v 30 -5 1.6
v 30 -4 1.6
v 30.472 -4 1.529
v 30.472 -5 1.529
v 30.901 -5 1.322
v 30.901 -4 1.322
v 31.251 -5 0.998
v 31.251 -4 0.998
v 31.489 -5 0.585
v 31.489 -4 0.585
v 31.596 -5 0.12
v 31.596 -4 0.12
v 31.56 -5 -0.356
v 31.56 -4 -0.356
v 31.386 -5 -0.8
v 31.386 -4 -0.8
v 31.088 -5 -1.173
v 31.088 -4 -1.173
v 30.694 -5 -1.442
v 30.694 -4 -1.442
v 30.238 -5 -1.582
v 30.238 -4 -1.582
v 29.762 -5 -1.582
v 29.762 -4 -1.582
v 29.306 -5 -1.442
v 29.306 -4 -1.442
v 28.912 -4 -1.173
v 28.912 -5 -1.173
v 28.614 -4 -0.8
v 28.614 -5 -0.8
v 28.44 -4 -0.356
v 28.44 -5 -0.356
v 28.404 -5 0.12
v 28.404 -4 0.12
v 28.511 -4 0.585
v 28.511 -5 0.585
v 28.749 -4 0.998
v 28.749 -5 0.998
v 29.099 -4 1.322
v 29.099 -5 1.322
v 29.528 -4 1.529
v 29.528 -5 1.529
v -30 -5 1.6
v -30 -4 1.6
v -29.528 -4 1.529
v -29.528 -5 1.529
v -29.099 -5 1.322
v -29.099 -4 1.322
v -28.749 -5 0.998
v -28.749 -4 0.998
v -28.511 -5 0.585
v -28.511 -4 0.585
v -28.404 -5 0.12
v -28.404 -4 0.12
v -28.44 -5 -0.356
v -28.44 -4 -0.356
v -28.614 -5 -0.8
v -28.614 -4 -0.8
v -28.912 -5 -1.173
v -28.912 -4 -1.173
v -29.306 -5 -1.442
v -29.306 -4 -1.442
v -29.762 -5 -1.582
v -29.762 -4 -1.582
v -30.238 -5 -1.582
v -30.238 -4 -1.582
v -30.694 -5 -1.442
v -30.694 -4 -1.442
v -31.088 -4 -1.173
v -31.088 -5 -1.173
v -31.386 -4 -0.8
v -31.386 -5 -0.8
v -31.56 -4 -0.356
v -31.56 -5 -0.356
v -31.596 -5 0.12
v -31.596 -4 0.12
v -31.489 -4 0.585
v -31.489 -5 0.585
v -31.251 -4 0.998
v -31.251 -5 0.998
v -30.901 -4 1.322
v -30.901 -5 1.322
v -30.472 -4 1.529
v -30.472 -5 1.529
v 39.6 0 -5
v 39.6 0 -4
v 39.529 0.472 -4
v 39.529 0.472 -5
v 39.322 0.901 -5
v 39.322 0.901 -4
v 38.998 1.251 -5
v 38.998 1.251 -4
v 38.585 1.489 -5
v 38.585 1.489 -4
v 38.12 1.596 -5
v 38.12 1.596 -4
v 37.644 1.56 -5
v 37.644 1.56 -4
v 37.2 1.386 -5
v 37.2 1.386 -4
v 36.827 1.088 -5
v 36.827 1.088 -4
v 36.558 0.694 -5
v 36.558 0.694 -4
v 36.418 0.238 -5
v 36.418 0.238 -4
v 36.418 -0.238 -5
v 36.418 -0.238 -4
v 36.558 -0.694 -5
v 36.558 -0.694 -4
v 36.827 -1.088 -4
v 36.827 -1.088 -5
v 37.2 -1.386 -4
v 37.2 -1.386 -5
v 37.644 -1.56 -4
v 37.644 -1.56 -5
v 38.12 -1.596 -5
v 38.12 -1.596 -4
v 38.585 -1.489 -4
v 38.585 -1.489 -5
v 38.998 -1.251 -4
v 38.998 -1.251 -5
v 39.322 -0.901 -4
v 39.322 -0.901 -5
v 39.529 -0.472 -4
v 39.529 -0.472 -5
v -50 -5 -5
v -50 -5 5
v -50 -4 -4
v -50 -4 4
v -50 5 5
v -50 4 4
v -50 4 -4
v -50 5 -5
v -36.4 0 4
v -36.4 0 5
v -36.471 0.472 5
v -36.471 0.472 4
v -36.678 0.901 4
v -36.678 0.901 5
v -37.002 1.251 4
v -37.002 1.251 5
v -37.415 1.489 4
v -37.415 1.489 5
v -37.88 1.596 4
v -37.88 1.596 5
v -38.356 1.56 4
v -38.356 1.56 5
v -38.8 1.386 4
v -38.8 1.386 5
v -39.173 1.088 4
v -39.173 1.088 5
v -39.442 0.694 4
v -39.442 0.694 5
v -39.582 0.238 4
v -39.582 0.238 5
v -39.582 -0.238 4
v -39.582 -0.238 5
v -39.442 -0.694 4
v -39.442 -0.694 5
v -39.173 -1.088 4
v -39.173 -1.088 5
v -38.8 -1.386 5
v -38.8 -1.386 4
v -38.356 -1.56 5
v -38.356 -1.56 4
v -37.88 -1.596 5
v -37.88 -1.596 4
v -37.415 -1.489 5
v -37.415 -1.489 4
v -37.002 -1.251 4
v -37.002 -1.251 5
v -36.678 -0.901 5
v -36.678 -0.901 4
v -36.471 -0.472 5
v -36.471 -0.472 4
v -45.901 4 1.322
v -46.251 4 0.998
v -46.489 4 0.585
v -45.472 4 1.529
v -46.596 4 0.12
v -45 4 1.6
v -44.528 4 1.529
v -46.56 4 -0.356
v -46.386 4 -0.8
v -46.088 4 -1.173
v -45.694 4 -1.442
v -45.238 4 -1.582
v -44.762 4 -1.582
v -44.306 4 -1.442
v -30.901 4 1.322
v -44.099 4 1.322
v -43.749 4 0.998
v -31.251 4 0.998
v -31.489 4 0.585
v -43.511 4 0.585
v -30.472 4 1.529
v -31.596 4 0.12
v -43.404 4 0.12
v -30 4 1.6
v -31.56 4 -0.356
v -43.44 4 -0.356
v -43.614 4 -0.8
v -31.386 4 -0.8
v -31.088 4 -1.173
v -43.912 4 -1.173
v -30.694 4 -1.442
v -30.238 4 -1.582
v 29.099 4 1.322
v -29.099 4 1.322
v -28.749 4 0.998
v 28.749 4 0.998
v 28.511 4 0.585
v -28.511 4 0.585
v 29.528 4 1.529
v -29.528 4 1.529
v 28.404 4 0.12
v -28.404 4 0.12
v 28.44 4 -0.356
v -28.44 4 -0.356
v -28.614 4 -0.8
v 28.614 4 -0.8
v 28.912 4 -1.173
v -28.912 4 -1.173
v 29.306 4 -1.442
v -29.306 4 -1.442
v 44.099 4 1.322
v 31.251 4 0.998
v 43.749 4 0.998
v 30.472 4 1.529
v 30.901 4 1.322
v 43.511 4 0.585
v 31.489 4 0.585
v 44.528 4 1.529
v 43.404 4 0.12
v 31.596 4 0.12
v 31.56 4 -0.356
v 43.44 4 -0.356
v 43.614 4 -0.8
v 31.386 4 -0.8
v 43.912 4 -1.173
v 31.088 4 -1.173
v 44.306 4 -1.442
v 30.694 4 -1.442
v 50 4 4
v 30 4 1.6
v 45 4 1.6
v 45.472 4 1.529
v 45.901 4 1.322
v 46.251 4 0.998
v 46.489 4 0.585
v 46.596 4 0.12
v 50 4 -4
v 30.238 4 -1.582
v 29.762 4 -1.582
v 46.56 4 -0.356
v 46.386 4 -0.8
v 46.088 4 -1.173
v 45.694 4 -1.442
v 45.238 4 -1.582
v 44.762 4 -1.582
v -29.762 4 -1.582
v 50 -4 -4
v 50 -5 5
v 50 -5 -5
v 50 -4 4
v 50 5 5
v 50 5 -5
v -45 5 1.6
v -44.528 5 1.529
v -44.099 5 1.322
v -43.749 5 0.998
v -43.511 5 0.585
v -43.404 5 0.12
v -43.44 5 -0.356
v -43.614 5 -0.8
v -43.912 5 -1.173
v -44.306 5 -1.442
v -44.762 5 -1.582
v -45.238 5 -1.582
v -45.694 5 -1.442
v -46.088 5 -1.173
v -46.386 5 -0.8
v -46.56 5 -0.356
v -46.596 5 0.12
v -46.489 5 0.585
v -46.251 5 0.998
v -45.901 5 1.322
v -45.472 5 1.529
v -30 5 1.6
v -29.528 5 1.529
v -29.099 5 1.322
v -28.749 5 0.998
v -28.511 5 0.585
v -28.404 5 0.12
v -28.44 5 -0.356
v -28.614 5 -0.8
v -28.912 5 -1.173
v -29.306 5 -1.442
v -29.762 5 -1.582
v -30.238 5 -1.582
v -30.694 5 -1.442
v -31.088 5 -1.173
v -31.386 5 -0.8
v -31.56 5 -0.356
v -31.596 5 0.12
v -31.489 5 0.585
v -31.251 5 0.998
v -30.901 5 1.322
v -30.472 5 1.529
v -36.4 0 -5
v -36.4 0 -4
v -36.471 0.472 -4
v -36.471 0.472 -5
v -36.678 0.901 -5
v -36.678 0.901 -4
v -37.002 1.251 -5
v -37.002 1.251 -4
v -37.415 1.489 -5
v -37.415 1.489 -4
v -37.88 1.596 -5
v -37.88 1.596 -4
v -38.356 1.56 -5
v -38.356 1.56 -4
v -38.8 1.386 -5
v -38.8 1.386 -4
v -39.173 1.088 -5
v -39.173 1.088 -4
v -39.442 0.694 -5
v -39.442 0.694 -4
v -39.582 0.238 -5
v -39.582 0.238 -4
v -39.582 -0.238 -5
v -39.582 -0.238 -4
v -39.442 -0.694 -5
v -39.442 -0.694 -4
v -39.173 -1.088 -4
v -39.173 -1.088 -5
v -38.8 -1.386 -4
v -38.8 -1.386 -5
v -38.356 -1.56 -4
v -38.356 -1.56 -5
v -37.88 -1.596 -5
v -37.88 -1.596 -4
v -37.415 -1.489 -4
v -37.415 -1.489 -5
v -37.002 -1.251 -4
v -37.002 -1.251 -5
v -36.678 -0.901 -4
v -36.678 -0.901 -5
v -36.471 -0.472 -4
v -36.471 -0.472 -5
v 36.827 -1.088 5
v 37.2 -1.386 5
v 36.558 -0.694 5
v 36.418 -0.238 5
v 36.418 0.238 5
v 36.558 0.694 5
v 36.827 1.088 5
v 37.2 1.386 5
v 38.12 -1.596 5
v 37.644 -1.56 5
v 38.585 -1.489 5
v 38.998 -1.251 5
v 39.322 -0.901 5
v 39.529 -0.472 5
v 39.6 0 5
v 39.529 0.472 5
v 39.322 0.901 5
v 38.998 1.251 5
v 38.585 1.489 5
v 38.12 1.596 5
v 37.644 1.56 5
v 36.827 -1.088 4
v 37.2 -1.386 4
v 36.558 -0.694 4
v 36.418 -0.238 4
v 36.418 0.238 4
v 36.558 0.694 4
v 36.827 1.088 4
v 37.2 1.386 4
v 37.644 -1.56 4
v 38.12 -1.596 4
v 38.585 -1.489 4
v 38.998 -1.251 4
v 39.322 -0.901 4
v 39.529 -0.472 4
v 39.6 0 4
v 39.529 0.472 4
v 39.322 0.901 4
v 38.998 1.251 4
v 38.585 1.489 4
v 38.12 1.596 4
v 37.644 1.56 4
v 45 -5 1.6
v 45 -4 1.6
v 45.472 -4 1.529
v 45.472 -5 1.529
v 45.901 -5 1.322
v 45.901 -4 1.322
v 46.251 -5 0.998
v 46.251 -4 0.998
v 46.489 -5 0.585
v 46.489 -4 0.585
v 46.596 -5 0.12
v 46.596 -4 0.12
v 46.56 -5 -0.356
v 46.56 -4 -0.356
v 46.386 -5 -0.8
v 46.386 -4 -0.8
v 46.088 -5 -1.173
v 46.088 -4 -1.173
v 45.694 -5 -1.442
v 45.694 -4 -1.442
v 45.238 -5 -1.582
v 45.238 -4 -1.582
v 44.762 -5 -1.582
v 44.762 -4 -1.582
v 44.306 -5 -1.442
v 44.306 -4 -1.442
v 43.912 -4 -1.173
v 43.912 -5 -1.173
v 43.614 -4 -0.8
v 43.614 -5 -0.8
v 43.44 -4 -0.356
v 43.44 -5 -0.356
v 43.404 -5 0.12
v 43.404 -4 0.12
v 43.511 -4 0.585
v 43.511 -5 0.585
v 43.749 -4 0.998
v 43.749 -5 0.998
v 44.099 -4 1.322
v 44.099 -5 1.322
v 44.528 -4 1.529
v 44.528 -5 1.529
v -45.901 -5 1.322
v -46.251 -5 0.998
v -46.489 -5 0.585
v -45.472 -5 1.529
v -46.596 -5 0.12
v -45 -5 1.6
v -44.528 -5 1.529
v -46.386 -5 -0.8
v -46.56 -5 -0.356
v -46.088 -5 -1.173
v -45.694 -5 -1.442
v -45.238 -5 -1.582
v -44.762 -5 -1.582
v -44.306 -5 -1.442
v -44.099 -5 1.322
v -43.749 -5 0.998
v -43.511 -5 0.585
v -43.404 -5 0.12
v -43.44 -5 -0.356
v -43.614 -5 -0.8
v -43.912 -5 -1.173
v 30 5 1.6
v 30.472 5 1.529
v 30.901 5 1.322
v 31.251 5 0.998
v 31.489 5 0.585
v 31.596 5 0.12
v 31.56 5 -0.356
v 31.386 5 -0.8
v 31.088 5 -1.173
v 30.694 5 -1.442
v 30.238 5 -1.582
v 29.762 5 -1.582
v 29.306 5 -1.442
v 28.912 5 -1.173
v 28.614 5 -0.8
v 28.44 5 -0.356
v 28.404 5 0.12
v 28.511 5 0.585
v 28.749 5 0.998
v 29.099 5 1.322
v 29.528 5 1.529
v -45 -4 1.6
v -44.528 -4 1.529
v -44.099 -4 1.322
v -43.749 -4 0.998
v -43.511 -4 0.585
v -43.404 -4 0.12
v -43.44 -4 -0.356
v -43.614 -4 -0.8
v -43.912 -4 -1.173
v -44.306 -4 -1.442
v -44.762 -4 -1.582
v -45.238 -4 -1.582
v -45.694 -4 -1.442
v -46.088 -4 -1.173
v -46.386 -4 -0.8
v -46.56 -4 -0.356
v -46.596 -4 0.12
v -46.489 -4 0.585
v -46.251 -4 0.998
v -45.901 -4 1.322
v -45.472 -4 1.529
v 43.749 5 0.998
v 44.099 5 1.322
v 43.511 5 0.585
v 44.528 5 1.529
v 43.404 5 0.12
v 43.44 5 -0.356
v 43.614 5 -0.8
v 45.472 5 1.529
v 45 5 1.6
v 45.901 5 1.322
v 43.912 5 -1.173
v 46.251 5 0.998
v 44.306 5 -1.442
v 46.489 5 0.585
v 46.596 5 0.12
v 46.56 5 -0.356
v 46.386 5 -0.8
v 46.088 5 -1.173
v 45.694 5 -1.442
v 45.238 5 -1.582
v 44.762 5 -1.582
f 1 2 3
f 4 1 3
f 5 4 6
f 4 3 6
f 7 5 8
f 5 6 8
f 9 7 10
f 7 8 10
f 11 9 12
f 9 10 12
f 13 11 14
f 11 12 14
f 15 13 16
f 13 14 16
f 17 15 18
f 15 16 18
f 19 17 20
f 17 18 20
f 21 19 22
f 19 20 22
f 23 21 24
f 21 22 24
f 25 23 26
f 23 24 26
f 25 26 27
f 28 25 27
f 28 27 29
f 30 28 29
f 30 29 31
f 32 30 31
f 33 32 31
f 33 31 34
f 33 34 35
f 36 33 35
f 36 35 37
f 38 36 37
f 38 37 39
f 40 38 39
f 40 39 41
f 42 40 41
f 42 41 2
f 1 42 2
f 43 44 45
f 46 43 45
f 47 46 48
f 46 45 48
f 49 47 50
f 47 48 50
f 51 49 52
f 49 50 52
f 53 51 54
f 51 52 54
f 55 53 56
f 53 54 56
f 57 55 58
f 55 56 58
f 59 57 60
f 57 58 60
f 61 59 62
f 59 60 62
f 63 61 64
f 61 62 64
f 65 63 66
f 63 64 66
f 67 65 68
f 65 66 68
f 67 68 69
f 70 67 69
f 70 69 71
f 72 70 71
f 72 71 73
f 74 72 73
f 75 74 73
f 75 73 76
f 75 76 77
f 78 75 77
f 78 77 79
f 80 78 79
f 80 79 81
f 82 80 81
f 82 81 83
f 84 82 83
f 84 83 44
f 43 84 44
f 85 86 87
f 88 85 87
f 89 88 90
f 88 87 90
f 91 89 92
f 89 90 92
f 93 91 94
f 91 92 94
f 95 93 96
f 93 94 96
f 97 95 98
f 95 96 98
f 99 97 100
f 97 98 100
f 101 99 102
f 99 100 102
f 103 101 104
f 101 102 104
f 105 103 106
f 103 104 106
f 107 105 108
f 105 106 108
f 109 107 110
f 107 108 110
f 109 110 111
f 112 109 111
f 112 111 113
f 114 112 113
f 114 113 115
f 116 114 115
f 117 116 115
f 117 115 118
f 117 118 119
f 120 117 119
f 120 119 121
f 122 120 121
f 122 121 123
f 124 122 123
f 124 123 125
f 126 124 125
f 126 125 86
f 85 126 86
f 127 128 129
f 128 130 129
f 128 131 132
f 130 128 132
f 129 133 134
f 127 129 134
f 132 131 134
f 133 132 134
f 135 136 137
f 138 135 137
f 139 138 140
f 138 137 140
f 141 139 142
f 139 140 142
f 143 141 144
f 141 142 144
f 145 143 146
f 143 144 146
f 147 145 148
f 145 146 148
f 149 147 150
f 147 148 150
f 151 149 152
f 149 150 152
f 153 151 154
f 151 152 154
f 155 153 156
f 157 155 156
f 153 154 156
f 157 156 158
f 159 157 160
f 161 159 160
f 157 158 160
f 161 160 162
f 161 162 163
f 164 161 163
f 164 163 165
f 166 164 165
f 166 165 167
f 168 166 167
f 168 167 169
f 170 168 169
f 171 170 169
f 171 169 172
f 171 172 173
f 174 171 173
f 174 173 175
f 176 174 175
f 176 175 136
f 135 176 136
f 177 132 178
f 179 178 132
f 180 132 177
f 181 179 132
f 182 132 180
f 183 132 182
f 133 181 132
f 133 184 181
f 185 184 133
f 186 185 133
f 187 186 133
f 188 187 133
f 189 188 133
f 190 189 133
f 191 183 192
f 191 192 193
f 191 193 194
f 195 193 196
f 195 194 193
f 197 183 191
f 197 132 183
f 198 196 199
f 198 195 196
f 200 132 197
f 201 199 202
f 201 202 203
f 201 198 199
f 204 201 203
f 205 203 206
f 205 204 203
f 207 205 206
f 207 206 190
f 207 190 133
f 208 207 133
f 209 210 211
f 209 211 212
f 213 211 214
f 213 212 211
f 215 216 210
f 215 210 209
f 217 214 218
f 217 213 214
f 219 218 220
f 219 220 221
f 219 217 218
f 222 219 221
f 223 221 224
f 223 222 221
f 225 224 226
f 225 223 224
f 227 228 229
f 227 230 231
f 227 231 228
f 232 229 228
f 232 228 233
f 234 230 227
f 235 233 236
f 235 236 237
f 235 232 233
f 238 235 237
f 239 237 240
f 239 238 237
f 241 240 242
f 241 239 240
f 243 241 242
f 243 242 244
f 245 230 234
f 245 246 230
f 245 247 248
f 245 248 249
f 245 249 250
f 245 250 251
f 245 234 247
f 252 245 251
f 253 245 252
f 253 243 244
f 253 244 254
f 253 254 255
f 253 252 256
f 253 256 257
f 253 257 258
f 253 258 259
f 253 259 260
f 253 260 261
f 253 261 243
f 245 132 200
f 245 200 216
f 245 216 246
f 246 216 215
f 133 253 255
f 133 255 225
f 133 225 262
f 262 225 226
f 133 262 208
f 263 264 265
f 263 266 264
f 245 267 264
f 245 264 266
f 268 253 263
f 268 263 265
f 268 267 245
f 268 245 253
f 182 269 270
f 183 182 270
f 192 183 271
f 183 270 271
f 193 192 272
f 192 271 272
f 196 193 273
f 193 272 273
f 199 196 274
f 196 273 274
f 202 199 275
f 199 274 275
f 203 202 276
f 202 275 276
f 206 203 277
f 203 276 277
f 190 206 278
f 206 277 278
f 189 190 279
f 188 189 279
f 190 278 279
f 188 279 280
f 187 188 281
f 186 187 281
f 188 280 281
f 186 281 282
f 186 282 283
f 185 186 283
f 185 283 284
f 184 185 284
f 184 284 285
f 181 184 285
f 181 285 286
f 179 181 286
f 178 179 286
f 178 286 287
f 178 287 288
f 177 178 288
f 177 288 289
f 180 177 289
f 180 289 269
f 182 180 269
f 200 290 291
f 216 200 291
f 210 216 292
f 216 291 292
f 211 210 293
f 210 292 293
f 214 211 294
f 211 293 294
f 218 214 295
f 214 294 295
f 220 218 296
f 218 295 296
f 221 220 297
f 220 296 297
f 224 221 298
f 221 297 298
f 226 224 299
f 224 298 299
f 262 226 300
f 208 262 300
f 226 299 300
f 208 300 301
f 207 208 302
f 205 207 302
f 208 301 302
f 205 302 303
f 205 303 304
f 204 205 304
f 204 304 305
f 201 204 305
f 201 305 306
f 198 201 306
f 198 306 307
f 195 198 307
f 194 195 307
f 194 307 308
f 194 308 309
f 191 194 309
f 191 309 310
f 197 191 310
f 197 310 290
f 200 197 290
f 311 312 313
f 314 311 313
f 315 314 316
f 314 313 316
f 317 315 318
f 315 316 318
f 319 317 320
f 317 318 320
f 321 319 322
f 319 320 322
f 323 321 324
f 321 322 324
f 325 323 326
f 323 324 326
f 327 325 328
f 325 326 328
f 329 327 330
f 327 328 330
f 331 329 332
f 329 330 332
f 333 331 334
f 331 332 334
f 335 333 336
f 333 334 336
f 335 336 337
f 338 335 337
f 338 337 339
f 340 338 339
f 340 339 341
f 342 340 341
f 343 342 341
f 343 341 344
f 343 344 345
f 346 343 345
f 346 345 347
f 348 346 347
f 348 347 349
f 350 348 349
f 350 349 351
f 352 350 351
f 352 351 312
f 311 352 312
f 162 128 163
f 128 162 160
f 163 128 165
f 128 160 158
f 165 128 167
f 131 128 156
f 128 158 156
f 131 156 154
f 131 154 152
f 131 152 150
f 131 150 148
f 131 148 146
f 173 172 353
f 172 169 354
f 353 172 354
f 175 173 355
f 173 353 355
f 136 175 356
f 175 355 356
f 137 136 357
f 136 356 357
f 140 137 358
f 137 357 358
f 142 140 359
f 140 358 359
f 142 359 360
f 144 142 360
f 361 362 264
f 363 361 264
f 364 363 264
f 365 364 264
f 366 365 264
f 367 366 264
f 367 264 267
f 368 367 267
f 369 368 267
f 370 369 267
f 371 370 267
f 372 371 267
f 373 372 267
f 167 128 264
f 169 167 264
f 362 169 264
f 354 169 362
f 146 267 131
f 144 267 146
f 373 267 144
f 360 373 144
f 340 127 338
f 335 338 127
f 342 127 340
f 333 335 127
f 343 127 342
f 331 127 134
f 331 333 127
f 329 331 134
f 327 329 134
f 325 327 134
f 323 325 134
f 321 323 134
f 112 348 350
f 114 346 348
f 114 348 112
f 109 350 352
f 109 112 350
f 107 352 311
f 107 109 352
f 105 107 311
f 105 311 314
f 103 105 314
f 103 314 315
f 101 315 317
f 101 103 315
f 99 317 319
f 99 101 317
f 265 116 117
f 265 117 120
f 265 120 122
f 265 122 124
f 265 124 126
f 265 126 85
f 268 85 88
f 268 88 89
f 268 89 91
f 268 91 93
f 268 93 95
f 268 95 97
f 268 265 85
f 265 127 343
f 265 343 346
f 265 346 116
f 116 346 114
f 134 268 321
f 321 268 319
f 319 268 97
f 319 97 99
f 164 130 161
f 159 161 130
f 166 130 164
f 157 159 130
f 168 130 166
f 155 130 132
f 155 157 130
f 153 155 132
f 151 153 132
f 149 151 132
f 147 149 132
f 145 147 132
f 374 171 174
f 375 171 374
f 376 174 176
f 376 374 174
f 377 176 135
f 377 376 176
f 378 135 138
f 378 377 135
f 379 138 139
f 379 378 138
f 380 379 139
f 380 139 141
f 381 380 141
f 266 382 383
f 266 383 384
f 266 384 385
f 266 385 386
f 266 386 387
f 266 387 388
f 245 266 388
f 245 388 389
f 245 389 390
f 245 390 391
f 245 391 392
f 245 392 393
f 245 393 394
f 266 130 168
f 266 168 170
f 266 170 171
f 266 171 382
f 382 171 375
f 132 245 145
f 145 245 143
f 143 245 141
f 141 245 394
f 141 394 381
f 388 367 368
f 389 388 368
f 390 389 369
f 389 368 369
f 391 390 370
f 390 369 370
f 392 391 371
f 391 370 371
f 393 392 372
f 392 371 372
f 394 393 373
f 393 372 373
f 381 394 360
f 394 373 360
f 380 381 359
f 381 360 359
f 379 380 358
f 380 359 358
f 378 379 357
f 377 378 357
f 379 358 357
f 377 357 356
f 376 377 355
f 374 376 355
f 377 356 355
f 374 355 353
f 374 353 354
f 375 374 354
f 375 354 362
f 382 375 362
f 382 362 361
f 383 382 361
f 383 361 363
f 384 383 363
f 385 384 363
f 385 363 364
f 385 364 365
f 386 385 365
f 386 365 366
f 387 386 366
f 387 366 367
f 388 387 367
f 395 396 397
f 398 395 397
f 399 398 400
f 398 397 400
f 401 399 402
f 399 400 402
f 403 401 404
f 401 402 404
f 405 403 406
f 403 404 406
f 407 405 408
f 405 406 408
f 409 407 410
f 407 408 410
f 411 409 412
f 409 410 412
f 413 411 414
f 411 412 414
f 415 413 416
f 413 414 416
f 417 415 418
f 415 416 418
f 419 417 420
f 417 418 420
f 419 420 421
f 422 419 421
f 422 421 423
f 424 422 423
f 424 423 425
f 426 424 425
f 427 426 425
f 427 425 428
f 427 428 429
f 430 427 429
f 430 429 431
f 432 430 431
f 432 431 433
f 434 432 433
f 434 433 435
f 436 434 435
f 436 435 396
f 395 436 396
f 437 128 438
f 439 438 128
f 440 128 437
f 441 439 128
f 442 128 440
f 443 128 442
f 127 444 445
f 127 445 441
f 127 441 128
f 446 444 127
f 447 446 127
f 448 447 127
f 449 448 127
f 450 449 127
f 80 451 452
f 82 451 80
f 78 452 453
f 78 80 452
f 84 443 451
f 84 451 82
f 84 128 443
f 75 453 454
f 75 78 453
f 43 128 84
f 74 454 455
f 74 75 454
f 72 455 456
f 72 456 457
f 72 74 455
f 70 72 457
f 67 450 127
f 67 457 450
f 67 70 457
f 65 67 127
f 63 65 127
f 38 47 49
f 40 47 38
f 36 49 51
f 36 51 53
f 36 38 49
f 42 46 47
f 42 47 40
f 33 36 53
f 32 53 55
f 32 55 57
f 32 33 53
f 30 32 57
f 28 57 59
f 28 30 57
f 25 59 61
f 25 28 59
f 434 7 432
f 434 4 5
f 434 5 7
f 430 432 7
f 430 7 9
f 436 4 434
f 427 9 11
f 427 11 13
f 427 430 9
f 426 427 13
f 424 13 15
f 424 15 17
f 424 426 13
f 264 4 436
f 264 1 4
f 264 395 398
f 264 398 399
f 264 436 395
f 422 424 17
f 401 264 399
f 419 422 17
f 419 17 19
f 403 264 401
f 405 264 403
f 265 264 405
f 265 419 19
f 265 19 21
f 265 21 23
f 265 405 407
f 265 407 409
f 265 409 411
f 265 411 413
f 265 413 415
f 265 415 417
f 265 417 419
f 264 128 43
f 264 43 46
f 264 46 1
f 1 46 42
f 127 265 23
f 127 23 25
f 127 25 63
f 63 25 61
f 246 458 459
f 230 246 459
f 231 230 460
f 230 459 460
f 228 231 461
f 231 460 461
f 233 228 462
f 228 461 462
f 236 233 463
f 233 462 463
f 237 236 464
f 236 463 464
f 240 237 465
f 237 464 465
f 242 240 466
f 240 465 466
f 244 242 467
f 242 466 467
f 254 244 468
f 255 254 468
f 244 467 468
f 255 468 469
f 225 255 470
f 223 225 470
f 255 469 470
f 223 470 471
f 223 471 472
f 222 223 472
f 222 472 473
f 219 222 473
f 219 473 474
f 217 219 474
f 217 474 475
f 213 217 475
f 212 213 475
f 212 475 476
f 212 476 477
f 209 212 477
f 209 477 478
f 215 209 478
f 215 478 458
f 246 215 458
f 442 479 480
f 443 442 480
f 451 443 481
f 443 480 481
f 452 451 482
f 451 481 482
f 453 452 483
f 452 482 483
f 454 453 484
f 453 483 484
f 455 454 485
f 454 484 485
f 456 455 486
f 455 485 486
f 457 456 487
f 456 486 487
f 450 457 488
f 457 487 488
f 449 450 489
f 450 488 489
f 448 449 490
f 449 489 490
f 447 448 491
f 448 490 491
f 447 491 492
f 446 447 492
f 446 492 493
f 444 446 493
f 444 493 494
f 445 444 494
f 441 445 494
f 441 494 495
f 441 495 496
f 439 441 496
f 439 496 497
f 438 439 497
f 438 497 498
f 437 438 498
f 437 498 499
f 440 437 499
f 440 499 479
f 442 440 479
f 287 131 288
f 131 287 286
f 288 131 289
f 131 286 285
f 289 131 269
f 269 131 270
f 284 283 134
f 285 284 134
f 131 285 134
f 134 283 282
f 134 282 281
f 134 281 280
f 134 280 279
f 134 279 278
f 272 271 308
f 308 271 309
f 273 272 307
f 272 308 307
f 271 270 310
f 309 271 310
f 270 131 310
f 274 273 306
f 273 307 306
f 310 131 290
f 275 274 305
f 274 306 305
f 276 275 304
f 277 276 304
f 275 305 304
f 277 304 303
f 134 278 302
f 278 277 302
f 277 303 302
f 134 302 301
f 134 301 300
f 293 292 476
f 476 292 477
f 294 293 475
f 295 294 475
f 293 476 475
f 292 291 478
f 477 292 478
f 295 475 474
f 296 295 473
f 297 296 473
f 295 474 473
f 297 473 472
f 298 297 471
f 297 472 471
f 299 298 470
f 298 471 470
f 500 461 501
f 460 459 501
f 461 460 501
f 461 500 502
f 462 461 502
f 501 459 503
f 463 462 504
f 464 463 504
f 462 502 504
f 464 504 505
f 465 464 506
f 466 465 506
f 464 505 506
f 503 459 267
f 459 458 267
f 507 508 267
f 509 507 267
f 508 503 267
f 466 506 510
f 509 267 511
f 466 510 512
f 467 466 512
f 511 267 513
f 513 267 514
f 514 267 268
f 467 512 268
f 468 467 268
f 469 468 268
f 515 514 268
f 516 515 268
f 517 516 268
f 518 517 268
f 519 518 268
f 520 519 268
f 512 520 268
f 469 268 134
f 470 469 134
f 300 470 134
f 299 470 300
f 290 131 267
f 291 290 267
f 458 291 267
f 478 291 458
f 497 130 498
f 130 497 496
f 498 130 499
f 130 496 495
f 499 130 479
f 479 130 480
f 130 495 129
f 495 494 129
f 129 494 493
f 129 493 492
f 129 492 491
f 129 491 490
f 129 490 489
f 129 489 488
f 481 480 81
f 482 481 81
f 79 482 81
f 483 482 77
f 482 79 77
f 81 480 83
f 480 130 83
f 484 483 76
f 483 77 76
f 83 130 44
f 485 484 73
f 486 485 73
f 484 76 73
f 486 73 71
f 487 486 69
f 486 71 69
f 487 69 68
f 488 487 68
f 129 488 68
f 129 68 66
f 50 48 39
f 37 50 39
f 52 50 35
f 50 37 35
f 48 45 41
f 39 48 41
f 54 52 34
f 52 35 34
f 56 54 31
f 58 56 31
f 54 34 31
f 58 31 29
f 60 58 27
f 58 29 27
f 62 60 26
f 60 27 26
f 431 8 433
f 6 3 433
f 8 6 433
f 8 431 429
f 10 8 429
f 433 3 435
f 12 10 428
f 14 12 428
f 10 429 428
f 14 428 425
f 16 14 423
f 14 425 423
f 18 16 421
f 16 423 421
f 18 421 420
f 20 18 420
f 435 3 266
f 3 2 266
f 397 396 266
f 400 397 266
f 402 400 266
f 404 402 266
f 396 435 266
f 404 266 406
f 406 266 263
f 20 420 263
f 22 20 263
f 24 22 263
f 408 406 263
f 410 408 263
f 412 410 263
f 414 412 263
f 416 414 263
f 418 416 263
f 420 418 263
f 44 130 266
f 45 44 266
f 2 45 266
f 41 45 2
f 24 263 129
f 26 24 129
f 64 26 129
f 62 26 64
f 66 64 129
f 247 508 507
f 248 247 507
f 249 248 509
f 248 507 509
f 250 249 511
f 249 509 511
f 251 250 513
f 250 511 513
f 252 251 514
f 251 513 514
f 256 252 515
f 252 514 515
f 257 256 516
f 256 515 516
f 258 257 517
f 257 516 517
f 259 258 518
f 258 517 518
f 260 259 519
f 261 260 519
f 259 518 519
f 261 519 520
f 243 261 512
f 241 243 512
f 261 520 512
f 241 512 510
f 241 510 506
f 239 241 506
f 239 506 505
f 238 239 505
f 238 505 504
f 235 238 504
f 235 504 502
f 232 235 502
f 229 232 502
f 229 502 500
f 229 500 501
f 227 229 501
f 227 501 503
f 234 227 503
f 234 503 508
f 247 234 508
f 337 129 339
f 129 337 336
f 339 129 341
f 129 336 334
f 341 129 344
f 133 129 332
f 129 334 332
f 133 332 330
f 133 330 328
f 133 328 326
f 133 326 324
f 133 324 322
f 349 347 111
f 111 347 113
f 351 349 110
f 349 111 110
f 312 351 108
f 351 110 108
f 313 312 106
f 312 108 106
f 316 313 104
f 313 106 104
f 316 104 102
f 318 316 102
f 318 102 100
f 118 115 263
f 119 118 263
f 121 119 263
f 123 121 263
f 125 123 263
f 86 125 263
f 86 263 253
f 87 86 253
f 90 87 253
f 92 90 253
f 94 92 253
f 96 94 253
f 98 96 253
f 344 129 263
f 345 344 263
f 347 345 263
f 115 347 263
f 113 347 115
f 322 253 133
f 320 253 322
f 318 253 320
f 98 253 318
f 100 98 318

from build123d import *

# Parameters (mm, degrees)
SKETCH_1_W          = 10
SKETCH_1_H          = 10
EXTRUDE_1_DEPTH     = 50
SKETCH_2_W          = 8
SKETCH_2_H          = 8
CUT_EXTRUDE_1_DEPTH = 101.249688279
SKETCH_3_R          = 1.6
CUT_EXTRUDE_2_DEPTH = 52.23475383
SKETCH_4_R          = 1.6
CUT_EXTRUDE_3_DEPTH = 52.23475383


with BuildPart() as part:
    # ｽｹｯﾁ1 → ﾎﾞｽ - 押し出し1 (new, symmetric)
    with BuildSketch(Plane(origin=(0, 0, 0), x_dir=(0, 0, -1), z_dir=(1, 0, 0))):
        Rectangle(SKETCH_1_W, SKETCH_1_H)
    extrude(amount=EXTRUDE_1_DEPTH, both=True)

    # ｽｹｯﾁ2 → ｶｯﾄ - 押し出し1 (cut, through all)
    with BuildSketch(Plane(origin=(50, 0, 0), x_dir=(0, 0, -1), z_dir=(1, 0, 0))):
        Rectangle(SKETCH_2_W, SKETCH_2_H)
    extrude(amount=-CUT_EXTRUDE_1_DEPTH, mode=Mode.SUBTRACT)

    # ｽｹｯﾁ3 → ｶｯﾄ - 押し出し2 (cut, through all)
    with BuildSketch(Plane(origin=(0, 5, 0), x_dir=(1, 0, 0), z_dir=(0, 1, 0))):
        with Locations(Location((-45, 0, 0), (0, 0, 270))):
            Circle(SKETCH_3_R)
        with Locations(Location((-30, 0, 0), (0, 0, 270))):
            Circle(SKETCH_3_R)
        with Locations(Location((30, 0, 0), (0, 0, 270))):
            Circle(SKETCH_3_R)
        with Locations(Location((45, 0, 0), (0, 0, 270))):
            Circle(SKETCH_3_R)
    extrude(amount=-CUT_EXTRUDE_2_DEPTH, mode=Mode.SUBTRACT)

    # ｽｹｯﾁ4 → ｶｯﾄ - 押し出し3 (cut, through all)
    with BuildSketch(Plane.XY.offset(5)):
        with Locations((-38, 0)):
            Circle(SKETCH_4_R)
        with Locations((38, 0)):
            Circle(SKETCH_4_R)
    extrude(amount=-CUT_EXTRUDE_3_DEPTH, mode=Mode.SUBTRACT)


solid = part.part
